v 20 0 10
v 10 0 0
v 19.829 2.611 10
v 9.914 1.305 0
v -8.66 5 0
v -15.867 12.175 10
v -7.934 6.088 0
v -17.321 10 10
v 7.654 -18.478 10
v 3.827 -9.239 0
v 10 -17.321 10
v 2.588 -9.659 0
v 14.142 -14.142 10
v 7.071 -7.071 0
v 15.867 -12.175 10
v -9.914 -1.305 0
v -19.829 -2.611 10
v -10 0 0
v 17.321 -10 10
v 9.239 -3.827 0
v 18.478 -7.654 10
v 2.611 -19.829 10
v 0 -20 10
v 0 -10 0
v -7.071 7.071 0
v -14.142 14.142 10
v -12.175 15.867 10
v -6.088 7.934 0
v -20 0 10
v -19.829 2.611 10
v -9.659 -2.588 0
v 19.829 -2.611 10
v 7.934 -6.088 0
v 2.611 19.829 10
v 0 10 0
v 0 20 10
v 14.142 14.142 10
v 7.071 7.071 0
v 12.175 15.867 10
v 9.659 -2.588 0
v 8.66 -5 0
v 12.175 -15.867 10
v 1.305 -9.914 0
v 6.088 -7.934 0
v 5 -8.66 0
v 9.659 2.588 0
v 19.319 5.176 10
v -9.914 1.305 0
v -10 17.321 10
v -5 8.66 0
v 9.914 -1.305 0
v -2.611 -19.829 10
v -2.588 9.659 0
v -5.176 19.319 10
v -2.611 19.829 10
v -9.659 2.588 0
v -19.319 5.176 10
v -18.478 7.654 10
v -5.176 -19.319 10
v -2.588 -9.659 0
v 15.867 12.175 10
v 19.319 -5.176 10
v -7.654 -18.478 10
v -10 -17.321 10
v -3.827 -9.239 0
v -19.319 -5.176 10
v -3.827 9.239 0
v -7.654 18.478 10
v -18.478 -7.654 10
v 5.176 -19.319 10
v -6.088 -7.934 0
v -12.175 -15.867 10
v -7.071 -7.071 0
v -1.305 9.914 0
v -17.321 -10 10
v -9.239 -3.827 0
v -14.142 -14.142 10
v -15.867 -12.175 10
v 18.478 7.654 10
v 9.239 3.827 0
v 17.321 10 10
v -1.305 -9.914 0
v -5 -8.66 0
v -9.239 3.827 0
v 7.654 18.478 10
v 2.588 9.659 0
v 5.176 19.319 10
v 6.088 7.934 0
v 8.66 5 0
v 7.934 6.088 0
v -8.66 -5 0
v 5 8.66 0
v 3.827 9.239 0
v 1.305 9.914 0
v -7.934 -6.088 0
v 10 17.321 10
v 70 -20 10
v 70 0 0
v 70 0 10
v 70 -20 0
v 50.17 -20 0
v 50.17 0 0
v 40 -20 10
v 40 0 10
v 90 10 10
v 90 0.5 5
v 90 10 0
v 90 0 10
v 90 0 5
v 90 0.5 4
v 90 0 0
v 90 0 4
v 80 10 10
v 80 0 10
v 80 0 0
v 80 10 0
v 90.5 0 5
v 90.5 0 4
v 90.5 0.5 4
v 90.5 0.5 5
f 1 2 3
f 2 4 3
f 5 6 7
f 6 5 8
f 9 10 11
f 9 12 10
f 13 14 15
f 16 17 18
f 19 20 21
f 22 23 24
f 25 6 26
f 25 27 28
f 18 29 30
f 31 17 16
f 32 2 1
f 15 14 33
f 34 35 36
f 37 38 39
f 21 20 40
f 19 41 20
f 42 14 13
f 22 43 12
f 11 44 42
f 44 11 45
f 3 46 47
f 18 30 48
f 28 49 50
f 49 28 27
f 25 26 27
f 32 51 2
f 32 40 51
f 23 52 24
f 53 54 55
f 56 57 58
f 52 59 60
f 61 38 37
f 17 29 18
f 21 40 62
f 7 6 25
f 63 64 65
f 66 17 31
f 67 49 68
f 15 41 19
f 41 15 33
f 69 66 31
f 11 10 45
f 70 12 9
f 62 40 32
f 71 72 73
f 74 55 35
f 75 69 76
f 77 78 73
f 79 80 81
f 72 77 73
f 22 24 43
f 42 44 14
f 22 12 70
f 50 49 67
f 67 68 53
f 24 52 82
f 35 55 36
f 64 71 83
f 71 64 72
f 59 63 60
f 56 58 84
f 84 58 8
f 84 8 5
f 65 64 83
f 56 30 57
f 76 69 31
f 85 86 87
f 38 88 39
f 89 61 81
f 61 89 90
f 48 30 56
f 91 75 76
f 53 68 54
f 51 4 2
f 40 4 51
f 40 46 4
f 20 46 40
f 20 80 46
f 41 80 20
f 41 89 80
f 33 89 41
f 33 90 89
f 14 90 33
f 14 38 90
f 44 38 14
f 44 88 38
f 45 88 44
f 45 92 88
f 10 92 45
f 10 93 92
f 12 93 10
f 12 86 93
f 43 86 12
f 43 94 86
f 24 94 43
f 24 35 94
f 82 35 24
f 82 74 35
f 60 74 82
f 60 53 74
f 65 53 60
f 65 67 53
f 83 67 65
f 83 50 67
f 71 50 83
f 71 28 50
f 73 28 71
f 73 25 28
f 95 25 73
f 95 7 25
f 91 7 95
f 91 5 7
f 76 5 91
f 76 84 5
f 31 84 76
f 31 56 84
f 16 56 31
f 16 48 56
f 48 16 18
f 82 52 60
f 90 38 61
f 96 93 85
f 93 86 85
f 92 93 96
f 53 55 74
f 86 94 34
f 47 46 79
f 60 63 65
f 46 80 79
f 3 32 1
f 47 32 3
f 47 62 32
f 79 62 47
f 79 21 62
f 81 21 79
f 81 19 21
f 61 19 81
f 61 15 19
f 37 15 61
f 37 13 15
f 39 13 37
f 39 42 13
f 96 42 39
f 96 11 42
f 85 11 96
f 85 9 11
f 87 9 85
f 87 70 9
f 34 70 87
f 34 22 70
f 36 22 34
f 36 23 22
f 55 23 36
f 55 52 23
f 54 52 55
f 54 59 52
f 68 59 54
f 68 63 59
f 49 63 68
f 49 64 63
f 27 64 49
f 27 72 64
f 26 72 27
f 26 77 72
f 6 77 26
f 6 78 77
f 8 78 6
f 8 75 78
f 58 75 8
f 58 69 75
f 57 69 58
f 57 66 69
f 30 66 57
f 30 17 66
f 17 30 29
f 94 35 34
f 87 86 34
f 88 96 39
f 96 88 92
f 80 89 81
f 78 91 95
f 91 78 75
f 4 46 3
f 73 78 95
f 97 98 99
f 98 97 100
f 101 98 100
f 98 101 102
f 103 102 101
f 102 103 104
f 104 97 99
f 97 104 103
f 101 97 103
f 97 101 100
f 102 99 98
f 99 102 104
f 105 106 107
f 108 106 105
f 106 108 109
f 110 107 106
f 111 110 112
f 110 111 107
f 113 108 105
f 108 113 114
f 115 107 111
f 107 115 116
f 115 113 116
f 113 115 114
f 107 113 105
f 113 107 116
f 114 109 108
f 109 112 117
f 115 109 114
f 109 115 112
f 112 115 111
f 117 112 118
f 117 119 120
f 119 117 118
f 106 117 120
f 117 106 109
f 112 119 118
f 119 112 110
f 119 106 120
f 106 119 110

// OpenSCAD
// Three things that must NOT fail the 45 deg limit:
//  1. a true 45 deg cone;
//  2. a wedge whose underside is 45.5 deg from vertical: 0.5 deg past the limit, inside the 1 deg
//     facet tolerance (tessellation / STL rounding noise);
//  3. a 0.5 x 0.5 mm nub whose 0.25 mm^2 underside is below the 1 mm^2 region floor.
$fn = 48;
cylinder(h = 10, r1 = 10, r2 = 20);
translate([40, 0, 0]) rotate([90, 0, 0]) linear_extrude(20) polygon([[10.17, 0], [30, 0], [30, 10], [0, 10]]);
translate([80, 0, 0]) cube([10, 10, 10]);
translate([89.8, 0, 4]) cube([0.7, 0.5, 1]);
